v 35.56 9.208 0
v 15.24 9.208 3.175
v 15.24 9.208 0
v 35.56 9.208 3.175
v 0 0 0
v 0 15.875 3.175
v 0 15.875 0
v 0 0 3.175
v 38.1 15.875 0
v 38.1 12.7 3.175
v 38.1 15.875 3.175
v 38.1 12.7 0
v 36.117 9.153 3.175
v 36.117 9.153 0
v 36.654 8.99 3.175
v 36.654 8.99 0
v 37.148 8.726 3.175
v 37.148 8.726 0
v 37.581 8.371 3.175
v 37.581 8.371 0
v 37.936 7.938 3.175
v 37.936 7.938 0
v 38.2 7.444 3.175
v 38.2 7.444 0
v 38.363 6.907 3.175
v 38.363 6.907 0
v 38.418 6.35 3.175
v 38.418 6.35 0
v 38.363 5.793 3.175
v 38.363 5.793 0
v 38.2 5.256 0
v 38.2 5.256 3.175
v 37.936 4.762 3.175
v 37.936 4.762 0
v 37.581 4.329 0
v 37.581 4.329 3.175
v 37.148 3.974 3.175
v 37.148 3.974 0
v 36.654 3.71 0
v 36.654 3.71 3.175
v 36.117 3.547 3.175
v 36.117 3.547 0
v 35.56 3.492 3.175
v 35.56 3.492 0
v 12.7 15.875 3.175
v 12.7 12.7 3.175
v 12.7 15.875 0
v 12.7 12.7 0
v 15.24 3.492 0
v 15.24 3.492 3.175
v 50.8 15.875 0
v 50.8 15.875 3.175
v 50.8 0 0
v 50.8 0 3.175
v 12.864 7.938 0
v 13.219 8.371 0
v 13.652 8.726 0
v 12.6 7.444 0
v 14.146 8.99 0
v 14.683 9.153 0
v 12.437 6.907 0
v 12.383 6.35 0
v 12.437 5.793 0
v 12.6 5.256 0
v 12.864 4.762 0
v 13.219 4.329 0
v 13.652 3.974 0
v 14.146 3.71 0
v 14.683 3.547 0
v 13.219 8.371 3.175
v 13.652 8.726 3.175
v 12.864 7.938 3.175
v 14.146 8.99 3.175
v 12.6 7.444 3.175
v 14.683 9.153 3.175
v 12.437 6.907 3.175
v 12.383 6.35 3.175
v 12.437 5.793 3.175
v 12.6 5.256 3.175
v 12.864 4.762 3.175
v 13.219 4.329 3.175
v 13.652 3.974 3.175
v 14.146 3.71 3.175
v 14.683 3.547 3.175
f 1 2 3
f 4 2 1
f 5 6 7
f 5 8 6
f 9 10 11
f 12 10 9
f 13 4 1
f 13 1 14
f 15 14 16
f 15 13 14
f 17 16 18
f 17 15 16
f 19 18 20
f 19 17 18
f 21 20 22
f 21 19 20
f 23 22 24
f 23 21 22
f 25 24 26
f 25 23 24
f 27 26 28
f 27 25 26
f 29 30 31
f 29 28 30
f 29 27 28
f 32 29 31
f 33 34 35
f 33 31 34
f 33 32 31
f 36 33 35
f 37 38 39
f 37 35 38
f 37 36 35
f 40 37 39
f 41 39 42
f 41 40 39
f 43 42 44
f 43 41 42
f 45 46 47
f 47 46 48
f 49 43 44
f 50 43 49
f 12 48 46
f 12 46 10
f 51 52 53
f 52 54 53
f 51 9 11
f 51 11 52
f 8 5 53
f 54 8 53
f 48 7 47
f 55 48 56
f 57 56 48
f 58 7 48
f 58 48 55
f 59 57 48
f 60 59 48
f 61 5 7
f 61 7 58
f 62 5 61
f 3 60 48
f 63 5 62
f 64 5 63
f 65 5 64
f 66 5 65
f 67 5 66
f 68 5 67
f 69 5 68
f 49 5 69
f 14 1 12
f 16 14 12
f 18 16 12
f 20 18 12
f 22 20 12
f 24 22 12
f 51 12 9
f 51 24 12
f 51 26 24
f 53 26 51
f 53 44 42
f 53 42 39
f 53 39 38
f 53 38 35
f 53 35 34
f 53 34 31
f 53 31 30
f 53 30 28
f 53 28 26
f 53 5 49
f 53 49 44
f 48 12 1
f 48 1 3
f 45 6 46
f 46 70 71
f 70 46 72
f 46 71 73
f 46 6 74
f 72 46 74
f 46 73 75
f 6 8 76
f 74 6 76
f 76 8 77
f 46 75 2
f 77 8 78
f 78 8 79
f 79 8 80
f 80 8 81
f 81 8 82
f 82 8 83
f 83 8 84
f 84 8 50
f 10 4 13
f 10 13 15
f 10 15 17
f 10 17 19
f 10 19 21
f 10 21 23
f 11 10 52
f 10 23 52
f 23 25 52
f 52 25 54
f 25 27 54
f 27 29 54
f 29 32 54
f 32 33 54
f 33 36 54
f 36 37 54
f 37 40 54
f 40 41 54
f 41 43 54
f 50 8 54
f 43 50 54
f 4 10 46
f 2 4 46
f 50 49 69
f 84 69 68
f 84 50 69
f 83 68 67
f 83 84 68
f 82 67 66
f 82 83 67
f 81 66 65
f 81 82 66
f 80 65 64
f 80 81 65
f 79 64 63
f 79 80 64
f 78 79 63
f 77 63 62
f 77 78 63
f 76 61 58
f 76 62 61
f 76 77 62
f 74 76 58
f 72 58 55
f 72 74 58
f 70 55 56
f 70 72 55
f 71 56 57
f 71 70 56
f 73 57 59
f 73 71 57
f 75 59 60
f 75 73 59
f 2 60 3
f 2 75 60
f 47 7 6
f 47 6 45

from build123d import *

# Parameters (mm, degrees)
SKETCH1_W       = 50.8
SKETCH1_H       = 12.7
EXTRUDE1_DEPTH  = 3.175
EXTRUDE2_DEPTH  = 4.175
SKETCH3_W       = 12.7
SKETCH3_H       = 3.175
EXTRUDE3_DEPTH  = 3.175
LPATTERN1_COUNT = 2
LPATTERN1_PITCH = 38.1


with BuildPart() as part:
    # Sketch1 → Extrude1 (new body)
    with BuildSketch(Plane.XY):
        with Locations((25.4, 6.35)):
            Rectangle(SKETCH1_W, SKETCH1_H)
    extrude(amount=EXTRUDE1_DEPTH)

    # Sketch2 → Extrude2 (cut, through all)
    with BuildSketch(Plane.XY.offset(3.175)):
        with BuildLine():
            Line((15.24, 9.2075), (35.56, 9.2075))
            ThreePointArc((35.56, 9.2075), (38.4175, 6.35), (35.56, 3.4925))
            Line((35.56, 3.4925), (15.24, 3.4925))
            ThreePointArc((15.24, 3.4925), (12.3825, 6.35), (15.24, 9.2075))
        make_face()
    extrude(amount=-EXTRUDE2_DEPTH, mode=Mode.SUBTRACT)

    # Sketch3 → Extrude3 (add)
    with BuildSketch(Plane(origin=(0, 12.7, 0), x_dir=(1, 0, 0), z_dir=(0, 1, 0))):
        with Locations((6.35, -1.5875)):
            Rectangle(SKETCH3_W, SKETCH3_H)
    extrude3 = extrude(amount=EXTRUDE3_DEPTH)

    # LPattern1: Extrude3 ×2
    with Locations(*[(i * LPATTERN1_PITCH, 0, 0) for i in range(1, LPATTERN1_COUNT)]):
        add(extrude3)


solid = part.part
